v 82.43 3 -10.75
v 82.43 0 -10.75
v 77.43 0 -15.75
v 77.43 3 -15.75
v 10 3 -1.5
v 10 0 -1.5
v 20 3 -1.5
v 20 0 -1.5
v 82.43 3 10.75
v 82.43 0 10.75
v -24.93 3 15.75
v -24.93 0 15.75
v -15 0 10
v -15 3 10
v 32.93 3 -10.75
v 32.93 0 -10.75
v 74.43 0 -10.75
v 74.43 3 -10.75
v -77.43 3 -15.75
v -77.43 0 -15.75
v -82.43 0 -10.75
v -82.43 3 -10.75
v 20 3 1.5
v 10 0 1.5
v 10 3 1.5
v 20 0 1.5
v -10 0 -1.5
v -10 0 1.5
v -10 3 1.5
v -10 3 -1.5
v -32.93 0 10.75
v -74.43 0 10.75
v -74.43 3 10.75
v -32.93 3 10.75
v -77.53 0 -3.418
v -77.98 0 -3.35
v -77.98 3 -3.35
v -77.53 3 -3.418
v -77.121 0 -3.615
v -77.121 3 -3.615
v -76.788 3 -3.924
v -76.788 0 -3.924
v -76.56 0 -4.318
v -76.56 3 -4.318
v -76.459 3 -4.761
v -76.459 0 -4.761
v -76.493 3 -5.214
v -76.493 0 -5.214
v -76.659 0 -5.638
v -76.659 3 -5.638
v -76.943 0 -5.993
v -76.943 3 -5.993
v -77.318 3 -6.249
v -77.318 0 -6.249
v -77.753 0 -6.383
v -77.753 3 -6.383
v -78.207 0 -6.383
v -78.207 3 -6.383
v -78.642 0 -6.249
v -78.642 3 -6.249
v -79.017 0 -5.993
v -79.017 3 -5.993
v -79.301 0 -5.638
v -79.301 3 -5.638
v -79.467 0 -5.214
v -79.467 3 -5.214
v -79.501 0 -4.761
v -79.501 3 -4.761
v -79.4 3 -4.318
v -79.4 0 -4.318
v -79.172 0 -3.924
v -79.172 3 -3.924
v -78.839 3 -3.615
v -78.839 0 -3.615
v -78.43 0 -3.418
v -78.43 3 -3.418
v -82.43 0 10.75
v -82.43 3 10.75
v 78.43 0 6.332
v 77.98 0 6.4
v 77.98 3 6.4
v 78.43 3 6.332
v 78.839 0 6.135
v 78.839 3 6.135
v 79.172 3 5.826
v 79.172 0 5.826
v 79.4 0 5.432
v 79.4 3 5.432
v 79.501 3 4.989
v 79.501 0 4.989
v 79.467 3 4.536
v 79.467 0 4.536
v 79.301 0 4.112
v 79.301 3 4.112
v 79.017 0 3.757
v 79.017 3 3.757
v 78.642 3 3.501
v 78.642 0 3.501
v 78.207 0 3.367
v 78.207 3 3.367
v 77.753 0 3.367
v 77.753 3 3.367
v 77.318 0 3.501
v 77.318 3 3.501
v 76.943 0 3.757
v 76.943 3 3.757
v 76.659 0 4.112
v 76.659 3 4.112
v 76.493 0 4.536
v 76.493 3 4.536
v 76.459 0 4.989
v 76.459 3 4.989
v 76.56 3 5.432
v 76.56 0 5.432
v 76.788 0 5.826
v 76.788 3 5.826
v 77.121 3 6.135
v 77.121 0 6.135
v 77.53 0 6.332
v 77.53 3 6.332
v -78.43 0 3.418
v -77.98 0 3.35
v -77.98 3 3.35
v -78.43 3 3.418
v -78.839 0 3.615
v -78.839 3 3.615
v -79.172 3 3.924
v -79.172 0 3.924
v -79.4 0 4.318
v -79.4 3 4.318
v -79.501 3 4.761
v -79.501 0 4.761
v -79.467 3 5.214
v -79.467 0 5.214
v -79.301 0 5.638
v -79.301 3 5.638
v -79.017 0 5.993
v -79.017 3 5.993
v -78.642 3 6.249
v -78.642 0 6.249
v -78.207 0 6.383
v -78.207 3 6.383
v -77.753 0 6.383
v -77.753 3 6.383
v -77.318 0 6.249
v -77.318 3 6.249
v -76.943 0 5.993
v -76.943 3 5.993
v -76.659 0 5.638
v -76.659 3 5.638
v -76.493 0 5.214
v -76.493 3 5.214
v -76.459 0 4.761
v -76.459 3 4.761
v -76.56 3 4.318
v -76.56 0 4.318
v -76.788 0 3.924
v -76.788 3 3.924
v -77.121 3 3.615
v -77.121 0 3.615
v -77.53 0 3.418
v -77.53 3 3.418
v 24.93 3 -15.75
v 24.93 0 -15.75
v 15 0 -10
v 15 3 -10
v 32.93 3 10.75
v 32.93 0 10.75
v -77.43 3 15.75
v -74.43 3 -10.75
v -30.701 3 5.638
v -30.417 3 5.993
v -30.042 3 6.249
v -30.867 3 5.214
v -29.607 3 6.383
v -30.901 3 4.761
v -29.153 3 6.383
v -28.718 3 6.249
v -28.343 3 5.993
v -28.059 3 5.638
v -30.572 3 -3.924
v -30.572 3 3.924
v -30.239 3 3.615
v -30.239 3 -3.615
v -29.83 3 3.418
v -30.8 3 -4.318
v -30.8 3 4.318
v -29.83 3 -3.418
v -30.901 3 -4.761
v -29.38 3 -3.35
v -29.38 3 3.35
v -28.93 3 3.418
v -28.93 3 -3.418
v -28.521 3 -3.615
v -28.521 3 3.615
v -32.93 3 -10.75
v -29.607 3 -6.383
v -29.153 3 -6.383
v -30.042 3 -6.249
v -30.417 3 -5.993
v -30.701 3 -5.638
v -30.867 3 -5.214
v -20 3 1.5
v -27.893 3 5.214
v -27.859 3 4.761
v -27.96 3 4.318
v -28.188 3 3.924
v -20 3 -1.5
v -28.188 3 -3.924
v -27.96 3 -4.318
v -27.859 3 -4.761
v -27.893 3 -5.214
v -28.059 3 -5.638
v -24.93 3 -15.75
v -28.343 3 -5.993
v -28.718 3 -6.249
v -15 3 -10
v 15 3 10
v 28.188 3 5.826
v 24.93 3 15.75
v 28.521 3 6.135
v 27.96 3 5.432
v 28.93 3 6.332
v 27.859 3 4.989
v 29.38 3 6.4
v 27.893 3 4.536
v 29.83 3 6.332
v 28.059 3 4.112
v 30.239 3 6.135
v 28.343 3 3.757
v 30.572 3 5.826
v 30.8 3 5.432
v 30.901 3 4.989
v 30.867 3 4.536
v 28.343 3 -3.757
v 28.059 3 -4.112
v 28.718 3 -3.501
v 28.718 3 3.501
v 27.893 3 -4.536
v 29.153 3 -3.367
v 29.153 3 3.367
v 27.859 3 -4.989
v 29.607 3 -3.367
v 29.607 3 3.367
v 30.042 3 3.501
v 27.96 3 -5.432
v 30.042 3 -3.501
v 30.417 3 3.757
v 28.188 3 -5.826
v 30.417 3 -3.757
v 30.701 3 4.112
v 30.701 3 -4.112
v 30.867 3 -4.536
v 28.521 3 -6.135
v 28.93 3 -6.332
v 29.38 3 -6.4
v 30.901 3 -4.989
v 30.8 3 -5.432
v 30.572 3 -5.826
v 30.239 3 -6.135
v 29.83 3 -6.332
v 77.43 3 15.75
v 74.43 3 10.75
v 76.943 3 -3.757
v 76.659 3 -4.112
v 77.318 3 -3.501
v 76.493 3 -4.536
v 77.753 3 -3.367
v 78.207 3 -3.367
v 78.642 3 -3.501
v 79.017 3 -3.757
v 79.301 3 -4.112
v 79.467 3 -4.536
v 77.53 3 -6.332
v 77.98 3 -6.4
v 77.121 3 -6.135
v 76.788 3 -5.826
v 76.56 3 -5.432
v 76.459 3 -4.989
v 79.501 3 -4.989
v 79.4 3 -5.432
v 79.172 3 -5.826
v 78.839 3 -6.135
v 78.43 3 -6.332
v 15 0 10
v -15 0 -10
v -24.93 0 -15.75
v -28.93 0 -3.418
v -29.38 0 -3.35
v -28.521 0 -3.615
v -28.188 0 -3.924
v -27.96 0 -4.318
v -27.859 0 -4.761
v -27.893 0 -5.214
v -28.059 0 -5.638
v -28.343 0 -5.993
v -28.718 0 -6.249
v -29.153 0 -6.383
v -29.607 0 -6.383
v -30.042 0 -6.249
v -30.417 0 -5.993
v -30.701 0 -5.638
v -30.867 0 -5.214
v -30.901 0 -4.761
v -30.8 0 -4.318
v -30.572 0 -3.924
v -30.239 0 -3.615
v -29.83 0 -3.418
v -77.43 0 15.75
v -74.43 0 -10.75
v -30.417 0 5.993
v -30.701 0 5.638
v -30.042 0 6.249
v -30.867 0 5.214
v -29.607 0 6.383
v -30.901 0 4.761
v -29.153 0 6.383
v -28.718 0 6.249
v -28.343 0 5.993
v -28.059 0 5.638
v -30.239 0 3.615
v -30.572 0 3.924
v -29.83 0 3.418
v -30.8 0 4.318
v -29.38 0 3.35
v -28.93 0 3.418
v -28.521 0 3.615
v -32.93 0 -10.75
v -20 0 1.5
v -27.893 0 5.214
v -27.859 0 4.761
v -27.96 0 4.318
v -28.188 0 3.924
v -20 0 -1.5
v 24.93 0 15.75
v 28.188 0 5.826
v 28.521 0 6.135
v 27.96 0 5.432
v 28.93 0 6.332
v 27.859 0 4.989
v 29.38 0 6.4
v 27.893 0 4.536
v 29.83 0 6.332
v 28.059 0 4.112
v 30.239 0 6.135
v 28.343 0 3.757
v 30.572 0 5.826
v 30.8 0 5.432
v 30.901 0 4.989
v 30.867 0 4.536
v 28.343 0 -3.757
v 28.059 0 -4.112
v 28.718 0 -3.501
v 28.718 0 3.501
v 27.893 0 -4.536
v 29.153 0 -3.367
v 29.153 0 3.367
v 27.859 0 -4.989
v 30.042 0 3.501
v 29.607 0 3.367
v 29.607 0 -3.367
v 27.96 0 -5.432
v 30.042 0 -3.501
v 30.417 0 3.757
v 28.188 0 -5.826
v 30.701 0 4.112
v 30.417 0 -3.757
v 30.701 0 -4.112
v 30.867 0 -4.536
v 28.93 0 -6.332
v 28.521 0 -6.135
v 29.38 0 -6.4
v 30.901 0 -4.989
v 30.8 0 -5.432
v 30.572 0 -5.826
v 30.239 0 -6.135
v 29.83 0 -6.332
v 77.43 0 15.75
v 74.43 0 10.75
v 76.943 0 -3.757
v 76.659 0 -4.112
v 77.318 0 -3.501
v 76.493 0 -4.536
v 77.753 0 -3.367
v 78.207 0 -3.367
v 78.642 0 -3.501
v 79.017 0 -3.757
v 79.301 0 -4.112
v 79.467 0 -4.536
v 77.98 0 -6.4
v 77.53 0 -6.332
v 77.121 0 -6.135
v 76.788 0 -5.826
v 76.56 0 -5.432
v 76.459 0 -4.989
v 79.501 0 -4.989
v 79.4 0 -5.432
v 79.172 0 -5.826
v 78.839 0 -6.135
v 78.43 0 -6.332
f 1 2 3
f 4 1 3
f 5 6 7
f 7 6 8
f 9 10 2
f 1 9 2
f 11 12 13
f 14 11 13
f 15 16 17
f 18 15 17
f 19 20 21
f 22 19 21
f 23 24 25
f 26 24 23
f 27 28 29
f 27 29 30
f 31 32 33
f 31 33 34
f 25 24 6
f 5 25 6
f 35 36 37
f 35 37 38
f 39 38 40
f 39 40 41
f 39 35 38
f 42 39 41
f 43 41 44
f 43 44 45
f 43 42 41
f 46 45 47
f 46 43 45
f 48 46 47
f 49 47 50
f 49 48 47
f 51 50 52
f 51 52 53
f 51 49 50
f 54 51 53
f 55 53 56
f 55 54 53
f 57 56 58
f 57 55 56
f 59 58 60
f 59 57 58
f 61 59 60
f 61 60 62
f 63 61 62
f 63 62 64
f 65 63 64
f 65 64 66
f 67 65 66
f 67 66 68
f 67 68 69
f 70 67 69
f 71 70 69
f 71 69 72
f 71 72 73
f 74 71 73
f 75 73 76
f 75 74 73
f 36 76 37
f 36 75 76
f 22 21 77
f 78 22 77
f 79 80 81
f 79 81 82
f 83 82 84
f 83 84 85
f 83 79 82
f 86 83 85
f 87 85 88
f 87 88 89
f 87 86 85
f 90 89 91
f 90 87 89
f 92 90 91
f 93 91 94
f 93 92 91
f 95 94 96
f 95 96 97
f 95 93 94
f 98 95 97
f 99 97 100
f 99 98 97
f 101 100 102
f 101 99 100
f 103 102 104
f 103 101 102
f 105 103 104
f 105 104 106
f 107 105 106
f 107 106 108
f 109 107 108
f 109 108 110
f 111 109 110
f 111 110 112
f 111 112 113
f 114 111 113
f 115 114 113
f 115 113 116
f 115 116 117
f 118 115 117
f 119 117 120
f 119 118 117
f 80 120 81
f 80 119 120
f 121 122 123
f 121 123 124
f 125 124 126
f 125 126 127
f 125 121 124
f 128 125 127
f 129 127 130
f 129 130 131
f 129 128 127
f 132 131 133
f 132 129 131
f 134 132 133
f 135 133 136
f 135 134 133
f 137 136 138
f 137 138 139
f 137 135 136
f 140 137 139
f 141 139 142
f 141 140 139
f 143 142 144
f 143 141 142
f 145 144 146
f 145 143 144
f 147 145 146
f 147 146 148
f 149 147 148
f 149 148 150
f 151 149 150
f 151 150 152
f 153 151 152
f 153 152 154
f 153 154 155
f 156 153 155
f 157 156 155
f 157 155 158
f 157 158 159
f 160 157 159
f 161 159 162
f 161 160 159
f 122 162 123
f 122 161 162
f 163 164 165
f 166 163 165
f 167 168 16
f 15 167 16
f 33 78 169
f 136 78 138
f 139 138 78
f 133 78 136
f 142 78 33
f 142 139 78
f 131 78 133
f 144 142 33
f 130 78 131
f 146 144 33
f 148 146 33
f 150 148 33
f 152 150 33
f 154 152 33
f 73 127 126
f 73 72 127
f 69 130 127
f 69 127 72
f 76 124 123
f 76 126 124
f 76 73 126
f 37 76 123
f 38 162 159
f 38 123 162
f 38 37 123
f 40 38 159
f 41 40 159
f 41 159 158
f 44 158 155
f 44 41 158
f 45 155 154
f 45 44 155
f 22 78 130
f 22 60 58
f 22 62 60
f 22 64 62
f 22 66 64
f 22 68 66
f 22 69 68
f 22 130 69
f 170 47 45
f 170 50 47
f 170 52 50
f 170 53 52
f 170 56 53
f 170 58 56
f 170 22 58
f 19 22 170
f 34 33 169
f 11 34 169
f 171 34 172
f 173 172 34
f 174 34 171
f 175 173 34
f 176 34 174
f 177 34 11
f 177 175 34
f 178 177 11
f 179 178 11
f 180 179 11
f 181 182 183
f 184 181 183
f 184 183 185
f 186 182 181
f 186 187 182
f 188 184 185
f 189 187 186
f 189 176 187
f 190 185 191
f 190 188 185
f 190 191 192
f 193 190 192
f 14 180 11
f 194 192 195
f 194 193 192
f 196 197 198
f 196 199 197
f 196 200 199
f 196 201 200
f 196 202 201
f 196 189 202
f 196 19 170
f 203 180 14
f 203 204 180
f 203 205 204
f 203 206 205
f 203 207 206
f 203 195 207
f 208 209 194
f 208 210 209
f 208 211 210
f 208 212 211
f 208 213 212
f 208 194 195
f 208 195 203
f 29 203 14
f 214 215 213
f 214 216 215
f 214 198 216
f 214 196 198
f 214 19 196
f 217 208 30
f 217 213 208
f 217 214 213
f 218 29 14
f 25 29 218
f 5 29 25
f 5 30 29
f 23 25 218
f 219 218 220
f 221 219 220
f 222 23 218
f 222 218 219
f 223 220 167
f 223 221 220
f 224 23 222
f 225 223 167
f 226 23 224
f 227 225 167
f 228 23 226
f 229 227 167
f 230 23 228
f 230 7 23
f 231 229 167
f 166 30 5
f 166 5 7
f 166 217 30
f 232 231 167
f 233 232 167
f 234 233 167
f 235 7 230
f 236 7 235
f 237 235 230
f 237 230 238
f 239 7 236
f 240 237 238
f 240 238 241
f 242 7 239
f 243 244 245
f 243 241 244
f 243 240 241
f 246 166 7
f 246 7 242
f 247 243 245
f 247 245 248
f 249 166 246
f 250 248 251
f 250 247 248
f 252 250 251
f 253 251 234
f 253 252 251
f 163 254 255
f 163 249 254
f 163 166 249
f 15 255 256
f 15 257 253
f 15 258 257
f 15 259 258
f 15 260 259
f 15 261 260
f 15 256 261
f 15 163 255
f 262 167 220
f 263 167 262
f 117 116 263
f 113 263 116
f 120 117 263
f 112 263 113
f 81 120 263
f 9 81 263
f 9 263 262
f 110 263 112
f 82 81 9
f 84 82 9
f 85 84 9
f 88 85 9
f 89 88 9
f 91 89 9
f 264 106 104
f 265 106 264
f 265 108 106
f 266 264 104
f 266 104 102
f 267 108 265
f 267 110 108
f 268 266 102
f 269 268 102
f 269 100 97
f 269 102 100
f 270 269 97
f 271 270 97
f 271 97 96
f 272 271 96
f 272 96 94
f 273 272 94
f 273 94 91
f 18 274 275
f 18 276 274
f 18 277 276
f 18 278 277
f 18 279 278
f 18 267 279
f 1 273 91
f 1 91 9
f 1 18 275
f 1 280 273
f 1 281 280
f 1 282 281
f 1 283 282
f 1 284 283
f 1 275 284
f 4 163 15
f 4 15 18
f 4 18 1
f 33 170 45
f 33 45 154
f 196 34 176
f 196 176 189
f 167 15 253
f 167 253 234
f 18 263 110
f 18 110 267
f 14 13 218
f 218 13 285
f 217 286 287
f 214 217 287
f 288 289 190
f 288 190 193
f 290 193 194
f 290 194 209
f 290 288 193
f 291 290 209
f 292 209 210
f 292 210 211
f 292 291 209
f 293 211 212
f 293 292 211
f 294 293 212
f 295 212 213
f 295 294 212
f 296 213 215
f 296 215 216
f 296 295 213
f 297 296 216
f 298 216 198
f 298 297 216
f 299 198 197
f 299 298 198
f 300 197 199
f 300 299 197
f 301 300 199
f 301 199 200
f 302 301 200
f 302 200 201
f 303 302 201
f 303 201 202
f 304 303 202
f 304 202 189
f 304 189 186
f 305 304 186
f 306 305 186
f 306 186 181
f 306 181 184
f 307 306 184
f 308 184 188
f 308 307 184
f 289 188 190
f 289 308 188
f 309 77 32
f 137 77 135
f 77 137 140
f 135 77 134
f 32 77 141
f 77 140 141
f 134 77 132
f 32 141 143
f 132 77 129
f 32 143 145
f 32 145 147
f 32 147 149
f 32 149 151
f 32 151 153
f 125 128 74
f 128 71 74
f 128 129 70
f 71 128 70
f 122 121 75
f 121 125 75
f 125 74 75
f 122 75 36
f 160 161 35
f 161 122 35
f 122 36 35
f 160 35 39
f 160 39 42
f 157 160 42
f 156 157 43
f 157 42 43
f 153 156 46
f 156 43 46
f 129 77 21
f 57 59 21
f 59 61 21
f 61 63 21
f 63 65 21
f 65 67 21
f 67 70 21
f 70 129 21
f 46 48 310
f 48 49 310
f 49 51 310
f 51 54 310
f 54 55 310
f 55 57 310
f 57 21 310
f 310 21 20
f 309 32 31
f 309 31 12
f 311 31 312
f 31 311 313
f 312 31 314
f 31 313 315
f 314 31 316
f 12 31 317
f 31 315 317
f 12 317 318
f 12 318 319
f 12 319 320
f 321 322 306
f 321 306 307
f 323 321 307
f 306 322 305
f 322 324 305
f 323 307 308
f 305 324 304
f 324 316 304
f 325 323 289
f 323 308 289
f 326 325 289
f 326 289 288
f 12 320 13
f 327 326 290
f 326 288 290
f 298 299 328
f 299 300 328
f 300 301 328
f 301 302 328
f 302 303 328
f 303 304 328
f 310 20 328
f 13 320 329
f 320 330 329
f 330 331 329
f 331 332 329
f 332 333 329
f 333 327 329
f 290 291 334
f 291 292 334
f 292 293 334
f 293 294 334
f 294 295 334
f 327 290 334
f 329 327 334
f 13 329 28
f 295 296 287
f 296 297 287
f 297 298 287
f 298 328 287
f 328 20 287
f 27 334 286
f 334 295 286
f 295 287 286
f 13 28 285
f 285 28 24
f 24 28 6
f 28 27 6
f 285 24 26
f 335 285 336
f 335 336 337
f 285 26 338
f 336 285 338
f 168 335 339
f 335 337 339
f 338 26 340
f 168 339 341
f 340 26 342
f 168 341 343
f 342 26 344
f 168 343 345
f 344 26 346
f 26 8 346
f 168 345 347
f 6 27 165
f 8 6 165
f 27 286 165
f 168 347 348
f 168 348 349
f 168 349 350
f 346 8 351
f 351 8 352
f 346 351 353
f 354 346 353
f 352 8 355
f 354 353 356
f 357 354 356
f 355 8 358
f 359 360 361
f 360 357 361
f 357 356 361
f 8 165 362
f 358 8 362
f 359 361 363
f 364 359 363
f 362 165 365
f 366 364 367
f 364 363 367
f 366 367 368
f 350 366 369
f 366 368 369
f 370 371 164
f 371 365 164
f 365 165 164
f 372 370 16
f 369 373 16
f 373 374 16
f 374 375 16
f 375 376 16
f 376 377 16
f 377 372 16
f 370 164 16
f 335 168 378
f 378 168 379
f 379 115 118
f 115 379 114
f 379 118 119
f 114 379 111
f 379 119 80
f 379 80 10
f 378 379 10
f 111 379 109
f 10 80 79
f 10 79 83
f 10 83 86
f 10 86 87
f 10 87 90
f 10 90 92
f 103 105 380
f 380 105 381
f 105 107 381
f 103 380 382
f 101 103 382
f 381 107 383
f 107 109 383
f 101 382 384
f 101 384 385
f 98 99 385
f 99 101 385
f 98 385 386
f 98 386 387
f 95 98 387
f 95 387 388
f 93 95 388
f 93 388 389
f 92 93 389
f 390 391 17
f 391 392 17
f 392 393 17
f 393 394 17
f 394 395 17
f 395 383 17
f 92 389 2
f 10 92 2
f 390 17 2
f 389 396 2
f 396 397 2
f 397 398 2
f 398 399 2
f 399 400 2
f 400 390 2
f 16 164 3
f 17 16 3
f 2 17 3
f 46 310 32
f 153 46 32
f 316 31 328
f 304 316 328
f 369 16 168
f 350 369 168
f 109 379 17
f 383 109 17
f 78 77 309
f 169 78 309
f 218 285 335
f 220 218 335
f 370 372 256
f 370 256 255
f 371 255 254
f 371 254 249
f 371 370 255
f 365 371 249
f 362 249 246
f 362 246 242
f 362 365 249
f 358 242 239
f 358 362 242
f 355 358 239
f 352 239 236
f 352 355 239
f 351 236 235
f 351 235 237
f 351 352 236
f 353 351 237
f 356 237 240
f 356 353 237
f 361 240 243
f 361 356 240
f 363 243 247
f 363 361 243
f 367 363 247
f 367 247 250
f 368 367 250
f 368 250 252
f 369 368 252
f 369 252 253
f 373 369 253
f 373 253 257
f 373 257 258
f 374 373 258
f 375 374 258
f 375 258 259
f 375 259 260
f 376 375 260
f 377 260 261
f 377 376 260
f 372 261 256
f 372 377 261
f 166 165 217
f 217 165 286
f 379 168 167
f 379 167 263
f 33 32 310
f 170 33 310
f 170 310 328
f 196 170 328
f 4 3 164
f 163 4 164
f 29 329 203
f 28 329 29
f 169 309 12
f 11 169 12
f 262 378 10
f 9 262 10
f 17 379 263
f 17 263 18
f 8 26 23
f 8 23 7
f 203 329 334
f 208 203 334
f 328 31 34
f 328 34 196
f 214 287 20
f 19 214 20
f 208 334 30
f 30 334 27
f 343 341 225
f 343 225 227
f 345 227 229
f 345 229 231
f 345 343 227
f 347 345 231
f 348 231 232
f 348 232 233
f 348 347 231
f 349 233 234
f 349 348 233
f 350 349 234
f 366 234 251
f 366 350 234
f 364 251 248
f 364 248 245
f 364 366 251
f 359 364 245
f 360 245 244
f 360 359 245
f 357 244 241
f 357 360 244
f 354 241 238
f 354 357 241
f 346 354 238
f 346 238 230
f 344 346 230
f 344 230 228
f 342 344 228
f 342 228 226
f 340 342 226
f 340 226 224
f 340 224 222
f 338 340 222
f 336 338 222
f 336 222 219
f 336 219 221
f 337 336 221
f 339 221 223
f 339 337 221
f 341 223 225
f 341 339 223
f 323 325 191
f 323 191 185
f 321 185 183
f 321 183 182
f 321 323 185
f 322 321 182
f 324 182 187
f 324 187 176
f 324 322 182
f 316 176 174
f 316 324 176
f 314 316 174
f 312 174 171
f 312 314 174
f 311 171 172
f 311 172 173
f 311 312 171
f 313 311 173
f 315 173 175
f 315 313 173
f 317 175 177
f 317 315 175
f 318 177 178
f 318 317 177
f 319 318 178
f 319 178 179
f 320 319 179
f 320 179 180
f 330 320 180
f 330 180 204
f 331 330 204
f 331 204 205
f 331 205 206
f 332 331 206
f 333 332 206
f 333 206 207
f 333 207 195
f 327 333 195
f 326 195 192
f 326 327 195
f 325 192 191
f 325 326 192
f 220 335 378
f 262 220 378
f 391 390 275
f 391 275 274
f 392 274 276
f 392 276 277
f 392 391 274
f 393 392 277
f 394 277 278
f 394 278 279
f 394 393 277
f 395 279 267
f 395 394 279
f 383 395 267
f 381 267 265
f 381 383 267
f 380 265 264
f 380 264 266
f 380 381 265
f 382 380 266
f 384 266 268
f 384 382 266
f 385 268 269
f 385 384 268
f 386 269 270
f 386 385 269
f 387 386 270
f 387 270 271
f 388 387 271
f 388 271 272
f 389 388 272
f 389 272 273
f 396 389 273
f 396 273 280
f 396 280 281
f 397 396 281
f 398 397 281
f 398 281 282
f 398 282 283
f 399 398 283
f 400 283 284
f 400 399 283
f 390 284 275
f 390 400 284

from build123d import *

# Parameters (mm, degrees)
SKETCH_1_R      = 1.525
SKETCH_1_W      = 41.5
SKETCH_1_H      = 21.5
SKETCH_1_W_2    = 10
SKETCH_1_H_2    = 3
EXTRUDE_1_DEPTH = 3


with BuildPart() as part:
    # 草图1 → 凸台-拉伸1 (new body)
    with BuildSketch(Plane(origin=(0, 0, 0), x_dir=(1, 0, 0), z_dir=(0, 1, 0))):
        Polygon((15, 10), (-15, 10), (-24.93, 15.75), (-77.43, 15.75), (-82.43, 10.75), (-82.43, -10.75), (-77.43, -15.75), (-24.93, -15.75), (-15, -10), (15, -10), (24.93, -15.75), (77.43, -15.75), (82.43, -10.75), (82.43, 10.75), (77.43, 15.75), (24.93, 15.75), align=None)
        with Locations(Location((-77.98, 4.875, 0), (0, 0, 270))):
            Circle(SKETCH_1_R, mode=Mode.SUBTRACT)
        with Locations(Location((-77.98, -4.875, 0), (0, 0, 90))):
            Circle(SKETCH_1_R, mode=Mode.SUBTRACT)
        with Locations(Location((77.98, -4.875, 0), (0, 0, 270))):
            Circle(SKETCH_1_R, mode=Mode.SUBTRACT)
        with Locations(Location((77.98, 4.875, 0), (0, 0, 90))):
            Circle(SKETCH_1_R, mode=Mode.SUBTRACT)
        with Locations(Location((-29.38, 4.875, 0), (0, 0, 270))):
            Circle(SKETCH_1_R, mode=Mode.SUBTRACT)
        with Locations(Location((-29.38, -4.875, 0), (0, 0, 90))):
            Circle(SKETCH_1_R, mode=Mode.SUBTRACT)
        with Locations(Location((29.38, -4.875, 0), (0, 0, 270))):
            Circle(SKETCH_1_R, mode=Mode.SUBTRACT)
        with Locations(Location((29.38, 4.875, 0), (0, 0, 90))):
            Circle(SKETCH_1_R, mode=Mode.SUBTRACT)
        with Locations((-53.68, 0)):
            Rectangle(SKETCH_1_W, SKETCH_1_H, mode=Mode.SUBTRACT)
        with Locations((-15, 0)):
            Rectangle(SKETCH_1_W_2, SKETCH_1_H_2, mode=Mode.SUBTRACT)
        with Locations((53.68, 0)):
            Rectangle(SKETCH_1_W, SKETCH_1_H, mode=Mode.SUBTRACT)
        with Locations((15, 0)):
            Rectangle(SKETCH_1_W_2, SKETCH_1_H_2, mode=Mode.SUBTRACT)
    extrude(amount=EXTRUDE_1_DEPTH)


solid = part.part
